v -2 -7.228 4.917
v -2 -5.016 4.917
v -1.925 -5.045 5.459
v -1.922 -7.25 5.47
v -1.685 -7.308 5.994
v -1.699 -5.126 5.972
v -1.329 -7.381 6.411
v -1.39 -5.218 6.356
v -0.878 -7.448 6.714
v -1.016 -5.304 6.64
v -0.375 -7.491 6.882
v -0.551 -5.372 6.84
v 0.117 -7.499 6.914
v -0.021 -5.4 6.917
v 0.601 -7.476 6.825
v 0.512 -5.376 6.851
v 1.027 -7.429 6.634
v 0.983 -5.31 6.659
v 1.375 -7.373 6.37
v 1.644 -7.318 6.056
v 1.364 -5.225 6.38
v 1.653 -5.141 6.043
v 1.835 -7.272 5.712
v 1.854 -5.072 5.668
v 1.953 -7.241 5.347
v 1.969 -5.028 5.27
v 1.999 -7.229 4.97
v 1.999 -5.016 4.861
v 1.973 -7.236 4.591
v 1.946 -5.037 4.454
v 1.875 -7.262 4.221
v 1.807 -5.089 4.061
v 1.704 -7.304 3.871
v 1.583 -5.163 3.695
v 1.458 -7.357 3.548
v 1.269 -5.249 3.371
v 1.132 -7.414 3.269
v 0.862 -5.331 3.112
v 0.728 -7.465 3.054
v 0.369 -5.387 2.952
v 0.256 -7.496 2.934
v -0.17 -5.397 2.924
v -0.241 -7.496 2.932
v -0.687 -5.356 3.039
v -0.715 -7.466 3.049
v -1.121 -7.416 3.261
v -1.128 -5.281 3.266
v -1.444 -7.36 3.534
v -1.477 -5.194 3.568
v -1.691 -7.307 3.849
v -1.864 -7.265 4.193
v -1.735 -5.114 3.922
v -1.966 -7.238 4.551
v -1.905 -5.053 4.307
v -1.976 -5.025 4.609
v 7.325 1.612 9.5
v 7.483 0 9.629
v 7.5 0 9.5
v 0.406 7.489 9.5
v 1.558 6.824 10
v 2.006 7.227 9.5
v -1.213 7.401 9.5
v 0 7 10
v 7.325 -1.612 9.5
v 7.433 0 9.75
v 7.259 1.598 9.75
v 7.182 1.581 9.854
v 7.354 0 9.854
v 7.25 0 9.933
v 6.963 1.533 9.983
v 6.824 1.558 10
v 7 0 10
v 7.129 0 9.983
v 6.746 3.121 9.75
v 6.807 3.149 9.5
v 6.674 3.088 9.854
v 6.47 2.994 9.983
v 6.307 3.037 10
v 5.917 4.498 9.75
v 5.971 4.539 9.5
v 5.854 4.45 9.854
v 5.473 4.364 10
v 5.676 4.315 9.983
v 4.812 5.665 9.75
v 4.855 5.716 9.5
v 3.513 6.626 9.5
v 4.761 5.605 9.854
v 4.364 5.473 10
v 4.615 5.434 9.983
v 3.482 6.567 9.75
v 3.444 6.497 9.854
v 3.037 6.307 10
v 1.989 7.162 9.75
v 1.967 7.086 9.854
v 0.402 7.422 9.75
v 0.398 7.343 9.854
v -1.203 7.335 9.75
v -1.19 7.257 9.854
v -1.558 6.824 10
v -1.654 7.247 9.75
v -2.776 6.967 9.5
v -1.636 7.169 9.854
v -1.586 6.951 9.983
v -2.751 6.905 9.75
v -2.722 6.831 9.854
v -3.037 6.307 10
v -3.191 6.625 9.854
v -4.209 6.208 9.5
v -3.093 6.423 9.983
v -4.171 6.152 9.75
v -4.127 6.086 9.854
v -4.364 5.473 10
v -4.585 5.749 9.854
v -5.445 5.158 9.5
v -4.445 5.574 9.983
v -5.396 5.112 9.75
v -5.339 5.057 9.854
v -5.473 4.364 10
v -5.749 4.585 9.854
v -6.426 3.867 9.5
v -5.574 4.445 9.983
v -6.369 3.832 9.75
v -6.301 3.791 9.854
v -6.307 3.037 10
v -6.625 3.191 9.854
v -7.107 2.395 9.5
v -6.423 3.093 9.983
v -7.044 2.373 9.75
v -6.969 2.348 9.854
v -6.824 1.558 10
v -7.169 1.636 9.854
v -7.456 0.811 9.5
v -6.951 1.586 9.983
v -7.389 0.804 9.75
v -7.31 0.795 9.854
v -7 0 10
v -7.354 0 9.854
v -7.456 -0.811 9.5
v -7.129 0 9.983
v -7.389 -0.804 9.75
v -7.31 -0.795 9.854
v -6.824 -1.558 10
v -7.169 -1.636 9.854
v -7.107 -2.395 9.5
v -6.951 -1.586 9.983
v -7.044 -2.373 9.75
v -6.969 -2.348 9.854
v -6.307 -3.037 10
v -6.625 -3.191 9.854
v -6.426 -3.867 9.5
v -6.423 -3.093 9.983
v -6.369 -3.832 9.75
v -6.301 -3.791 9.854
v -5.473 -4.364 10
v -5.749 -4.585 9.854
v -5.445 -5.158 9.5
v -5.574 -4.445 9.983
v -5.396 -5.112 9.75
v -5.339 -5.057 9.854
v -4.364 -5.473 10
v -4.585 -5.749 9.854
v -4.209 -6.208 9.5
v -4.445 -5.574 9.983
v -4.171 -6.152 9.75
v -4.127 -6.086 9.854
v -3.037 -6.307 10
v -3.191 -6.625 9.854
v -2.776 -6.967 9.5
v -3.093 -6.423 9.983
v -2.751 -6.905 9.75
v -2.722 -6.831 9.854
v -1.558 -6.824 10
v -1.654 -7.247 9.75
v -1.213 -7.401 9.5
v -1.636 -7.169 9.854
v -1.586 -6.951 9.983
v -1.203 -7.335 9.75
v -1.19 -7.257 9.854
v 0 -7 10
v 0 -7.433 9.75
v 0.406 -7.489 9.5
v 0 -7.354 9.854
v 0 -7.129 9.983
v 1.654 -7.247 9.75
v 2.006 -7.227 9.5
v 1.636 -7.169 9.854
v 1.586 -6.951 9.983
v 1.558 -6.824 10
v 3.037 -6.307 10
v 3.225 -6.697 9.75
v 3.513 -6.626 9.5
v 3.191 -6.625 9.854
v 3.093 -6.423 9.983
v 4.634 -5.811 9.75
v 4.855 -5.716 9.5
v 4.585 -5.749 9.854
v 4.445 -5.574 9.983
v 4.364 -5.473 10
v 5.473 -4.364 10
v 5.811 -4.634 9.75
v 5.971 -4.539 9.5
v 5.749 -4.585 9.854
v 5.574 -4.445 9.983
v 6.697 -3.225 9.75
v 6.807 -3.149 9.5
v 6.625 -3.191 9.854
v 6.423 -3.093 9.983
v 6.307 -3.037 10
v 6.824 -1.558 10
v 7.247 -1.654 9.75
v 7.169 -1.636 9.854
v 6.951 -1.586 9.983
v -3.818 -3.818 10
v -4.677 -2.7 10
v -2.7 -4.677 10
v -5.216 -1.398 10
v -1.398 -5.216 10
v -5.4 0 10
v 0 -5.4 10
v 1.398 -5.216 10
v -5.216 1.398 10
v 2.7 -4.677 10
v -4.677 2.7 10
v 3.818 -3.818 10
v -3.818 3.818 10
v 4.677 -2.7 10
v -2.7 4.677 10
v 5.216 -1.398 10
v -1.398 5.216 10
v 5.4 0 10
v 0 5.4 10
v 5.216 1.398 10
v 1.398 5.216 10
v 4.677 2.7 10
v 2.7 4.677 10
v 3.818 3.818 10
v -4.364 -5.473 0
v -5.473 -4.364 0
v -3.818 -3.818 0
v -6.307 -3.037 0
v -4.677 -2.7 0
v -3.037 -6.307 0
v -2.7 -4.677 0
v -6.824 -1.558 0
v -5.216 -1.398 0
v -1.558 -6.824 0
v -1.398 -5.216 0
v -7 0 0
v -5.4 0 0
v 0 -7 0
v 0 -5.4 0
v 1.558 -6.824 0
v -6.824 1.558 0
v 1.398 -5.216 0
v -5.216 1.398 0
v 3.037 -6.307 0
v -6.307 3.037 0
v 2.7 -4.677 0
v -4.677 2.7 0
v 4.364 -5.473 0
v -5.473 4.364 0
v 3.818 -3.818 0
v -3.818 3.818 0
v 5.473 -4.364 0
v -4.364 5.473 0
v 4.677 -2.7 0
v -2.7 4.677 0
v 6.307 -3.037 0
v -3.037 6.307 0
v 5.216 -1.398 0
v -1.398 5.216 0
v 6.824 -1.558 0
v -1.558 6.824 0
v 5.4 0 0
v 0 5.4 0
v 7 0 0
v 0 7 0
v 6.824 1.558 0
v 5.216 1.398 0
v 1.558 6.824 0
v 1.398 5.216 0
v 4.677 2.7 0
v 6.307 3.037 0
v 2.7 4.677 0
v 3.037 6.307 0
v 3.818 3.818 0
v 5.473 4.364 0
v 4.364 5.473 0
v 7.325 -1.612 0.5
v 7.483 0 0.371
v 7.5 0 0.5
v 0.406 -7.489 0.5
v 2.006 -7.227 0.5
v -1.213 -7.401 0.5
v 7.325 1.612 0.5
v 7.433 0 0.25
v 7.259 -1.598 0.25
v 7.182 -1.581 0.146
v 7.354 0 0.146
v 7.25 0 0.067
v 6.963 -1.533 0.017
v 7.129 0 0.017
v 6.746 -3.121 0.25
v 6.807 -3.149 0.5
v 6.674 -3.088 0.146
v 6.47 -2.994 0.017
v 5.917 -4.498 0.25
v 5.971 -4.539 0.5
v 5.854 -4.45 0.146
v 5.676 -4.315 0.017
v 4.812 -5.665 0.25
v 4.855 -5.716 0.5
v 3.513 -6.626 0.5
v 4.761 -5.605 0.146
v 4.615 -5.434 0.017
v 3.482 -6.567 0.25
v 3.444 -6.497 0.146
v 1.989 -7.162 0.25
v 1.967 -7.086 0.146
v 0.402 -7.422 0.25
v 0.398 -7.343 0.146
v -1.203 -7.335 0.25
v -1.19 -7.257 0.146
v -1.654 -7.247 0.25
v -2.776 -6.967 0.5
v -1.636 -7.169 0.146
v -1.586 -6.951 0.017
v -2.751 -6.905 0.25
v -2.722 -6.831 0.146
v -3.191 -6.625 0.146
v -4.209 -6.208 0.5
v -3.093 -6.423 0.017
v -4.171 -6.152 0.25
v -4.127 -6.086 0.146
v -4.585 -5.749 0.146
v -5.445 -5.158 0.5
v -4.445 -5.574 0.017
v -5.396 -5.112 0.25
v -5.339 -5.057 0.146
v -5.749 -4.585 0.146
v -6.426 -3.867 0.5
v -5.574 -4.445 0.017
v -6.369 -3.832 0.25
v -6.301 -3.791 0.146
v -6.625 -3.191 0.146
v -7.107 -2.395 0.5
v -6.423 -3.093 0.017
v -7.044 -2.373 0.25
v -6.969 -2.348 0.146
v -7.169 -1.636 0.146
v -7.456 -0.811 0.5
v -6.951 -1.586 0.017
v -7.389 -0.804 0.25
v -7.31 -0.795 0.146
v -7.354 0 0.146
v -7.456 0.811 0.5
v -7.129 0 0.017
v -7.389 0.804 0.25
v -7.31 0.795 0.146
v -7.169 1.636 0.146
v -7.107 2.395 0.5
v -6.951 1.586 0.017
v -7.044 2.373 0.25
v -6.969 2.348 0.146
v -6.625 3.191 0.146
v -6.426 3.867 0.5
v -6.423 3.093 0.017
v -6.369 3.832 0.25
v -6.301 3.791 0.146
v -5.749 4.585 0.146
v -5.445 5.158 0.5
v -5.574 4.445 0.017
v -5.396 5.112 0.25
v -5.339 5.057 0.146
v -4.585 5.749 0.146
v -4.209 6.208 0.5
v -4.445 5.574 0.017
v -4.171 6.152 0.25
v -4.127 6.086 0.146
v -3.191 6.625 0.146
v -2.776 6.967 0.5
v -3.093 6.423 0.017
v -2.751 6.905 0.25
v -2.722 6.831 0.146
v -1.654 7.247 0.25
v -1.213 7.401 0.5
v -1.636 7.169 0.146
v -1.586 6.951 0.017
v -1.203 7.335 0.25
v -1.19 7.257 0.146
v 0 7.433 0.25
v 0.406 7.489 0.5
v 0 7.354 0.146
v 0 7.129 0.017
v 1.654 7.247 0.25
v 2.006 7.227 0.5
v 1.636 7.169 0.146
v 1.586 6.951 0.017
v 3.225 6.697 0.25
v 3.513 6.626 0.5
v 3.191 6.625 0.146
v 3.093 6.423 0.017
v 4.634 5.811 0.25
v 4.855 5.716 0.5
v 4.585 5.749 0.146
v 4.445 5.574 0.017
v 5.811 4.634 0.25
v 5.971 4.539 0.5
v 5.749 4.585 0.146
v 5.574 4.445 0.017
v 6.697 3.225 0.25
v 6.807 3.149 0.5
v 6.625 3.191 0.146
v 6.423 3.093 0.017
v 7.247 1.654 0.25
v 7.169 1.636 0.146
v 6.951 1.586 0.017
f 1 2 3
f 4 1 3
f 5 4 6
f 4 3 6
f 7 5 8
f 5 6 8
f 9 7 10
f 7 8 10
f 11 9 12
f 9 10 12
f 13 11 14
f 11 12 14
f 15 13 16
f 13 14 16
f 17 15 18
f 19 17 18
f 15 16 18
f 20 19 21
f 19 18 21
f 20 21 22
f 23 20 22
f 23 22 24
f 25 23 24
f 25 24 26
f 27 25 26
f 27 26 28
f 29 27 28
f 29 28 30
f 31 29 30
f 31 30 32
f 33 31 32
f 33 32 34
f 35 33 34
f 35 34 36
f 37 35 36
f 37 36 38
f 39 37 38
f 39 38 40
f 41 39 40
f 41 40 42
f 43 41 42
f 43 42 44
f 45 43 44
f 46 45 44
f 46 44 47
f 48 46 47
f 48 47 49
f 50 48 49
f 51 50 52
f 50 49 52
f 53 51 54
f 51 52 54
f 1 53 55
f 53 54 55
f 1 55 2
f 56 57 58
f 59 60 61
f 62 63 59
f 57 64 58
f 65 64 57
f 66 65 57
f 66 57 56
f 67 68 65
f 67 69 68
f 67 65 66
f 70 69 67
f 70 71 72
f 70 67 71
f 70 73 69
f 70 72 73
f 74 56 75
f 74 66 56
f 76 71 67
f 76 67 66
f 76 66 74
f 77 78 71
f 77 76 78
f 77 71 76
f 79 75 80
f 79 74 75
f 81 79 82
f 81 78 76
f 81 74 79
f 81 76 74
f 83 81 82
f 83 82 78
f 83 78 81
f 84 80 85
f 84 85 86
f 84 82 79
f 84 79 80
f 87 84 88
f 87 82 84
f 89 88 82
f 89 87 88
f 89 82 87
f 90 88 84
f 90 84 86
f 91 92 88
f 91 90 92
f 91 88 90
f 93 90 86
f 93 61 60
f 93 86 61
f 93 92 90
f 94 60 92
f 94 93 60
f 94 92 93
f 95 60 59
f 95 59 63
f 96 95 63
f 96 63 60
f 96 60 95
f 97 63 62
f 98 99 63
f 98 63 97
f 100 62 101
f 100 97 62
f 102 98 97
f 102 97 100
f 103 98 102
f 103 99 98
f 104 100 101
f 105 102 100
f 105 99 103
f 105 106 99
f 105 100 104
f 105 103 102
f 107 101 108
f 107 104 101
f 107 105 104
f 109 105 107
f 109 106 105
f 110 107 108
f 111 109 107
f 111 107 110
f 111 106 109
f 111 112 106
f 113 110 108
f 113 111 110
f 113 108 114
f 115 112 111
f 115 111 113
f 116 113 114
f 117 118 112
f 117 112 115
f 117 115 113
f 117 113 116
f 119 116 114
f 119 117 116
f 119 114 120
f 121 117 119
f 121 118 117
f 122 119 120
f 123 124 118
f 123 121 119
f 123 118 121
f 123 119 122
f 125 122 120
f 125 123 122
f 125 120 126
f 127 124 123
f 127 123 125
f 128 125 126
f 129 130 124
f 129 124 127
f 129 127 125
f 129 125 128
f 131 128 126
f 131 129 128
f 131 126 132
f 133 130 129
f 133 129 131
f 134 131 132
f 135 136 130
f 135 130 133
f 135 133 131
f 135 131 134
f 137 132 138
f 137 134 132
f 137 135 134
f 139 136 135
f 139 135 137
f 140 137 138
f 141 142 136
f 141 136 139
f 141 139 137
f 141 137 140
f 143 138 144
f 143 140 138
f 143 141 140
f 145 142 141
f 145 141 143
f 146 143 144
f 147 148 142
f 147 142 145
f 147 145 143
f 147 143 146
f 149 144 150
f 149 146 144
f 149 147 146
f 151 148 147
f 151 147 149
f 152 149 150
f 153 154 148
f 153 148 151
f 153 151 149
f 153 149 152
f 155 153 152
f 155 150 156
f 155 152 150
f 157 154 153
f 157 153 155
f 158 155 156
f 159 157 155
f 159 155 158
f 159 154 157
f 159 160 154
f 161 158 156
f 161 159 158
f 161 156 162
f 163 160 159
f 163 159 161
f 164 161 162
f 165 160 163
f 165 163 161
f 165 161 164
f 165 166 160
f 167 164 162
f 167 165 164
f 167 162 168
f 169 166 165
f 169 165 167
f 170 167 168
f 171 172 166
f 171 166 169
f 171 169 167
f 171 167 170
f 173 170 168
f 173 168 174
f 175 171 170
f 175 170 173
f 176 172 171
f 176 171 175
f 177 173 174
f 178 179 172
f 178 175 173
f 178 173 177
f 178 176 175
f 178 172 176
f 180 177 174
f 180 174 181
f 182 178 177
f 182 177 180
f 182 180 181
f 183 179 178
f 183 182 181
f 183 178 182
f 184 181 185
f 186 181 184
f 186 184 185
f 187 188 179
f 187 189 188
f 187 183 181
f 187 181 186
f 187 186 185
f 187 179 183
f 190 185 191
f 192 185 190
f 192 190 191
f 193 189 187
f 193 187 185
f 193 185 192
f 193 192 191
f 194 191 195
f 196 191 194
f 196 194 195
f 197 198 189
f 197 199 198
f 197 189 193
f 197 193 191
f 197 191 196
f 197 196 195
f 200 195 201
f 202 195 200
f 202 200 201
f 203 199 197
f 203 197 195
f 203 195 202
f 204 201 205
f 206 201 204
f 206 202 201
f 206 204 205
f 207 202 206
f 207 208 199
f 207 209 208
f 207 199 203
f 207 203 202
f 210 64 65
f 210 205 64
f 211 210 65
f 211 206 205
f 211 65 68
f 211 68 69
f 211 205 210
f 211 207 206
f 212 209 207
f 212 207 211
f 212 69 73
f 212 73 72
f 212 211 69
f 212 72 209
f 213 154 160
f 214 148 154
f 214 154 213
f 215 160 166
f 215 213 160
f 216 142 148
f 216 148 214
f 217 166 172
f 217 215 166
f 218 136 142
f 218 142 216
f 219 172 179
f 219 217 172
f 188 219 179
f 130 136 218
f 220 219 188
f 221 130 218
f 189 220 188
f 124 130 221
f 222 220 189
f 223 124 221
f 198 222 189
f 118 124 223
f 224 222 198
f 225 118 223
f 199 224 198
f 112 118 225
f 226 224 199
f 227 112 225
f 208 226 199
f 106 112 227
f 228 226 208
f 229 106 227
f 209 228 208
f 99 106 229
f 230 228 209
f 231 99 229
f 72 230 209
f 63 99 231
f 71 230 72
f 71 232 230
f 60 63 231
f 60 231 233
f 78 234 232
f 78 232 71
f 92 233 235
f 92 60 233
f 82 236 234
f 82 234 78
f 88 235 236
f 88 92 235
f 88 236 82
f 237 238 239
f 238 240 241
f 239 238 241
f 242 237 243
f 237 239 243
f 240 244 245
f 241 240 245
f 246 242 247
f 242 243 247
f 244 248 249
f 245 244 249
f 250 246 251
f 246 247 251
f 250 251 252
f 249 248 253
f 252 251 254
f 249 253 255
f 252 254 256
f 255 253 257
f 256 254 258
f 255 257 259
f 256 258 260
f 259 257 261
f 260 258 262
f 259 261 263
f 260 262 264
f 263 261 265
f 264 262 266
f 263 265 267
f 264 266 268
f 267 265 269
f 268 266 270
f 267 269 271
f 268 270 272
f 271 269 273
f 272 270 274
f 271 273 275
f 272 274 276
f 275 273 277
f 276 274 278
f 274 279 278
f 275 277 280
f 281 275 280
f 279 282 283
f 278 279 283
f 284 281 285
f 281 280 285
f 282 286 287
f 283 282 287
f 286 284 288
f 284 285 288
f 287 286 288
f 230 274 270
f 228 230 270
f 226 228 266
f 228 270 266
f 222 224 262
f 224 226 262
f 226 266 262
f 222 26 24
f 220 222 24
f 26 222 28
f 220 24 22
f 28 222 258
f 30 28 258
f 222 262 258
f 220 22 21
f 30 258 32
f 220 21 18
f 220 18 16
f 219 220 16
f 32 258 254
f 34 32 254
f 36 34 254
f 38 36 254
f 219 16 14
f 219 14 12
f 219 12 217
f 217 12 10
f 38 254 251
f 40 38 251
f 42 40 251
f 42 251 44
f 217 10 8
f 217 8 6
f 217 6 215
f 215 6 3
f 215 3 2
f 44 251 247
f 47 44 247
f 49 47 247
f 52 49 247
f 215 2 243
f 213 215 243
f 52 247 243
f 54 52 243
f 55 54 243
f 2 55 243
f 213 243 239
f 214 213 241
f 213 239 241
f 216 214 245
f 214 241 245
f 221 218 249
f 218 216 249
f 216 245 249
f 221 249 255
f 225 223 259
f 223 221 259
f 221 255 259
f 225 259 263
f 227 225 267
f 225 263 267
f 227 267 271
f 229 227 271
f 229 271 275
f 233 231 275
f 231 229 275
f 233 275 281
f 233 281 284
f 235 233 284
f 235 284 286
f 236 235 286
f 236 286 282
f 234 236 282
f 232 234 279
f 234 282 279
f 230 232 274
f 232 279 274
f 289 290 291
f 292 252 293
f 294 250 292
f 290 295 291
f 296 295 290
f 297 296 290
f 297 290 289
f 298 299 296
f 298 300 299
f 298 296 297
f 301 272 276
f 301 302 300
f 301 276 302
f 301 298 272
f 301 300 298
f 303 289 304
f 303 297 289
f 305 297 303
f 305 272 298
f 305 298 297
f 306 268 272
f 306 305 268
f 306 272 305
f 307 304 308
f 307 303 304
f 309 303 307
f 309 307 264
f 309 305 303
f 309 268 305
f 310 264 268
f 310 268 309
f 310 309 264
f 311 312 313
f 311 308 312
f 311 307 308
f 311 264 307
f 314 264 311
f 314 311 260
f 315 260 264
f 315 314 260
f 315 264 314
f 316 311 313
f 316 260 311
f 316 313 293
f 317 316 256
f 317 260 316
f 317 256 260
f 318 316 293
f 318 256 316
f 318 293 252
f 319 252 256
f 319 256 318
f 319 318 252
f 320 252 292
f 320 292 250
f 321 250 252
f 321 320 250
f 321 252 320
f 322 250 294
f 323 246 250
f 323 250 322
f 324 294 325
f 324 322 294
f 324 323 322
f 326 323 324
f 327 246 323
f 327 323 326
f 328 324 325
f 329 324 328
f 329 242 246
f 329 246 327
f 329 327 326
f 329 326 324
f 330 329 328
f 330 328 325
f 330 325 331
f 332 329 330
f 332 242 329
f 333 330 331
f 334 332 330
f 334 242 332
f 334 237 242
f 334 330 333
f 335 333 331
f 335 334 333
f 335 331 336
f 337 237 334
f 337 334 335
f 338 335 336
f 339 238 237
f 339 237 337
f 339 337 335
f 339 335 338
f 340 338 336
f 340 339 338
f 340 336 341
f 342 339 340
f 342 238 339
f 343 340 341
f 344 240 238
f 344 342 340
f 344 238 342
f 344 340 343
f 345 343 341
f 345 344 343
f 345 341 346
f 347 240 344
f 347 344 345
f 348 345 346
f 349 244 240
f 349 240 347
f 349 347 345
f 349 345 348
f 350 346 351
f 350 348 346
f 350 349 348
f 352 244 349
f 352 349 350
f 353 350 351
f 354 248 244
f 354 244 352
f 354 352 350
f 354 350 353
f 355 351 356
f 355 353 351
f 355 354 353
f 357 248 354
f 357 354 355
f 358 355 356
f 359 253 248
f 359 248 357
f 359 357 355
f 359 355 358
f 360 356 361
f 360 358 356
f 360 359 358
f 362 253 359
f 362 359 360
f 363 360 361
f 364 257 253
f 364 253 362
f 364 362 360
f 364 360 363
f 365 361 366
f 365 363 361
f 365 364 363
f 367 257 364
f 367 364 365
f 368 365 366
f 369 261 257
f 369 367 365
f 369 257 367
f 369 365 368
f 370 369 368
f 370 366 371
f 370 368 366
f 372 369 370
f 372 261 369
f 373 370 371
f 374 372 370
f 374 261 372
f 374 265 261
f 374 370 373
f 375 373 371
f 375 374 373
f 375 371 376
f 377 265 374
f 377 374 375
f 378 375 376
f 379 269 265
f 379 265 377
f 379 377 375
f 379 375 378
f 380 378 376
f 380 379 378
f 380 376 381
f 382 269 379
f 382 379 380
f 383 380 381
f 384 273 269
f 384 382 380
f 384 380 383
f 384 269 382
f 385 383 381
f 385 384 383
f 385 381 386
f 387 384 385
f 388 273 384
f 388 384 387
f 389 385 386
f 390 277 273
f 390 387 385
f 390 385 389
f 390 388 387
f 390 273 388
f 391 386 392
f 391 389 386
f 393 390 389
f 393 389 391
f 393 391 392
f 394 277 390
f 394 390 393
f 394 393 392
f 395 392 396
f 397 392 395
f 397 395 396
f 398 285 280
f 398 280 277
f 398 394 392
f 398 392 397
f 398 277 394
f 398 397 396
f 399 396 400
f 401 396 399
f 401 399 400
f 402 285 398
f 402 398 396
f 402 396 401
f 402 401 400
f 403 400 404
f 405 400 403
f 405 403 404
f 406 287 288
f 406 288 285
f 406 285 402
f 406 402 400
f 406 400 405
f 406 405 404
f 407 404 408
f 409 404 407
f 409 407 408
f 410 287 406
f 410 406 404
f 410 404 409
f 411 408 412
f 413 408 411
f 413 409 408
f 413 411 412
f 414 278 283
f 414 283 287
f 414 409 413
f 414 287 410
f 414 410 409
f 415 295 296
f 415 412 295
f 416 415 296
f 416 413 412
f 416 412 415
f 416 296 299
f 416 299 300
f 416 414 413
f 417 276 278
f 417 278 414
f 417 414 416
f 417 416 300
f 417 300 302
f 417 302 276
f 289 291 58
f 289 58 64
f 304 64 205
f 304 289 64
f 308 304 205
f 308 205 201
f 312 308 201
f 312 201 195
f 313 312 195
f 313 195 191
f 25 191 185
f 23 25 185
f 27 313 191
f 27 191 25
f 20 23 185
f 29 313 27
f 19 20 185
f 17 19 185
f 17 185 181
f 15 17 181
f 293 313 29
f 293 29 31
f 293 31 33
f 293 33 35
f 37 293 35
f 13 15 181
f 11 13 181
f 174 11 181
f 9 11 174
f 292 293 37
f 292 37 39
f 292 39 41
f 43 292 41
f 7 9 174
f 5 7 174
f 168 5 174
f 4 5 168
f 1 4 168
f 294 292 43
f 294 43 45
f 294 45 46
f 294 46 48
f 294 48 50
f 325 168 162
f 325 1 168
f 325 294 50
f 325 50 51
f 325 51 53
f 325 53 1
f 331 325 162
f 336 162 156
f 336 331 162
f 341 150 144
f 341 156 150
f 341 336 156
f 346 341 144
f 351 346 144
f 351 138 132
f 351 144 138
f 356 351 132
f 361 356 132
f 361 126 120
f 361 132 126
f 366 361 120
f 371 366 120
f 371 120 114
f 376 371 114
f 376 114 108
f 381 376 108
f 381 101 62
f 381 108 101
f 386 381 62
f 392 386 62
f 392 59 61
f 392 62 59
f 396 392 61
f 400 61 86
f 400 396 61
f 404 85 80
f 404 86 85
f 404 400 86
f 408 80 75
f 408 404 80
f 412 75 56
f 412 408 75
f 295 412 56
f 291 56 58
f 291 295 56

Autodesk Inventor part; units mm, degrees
ref_plane "YZ Plane" through (0, 0, 0) normal (1, 0, 0) x (0, 1, 0)
ref_plane "XZ Plane" through (0, 0, 0) normal (0, 1, 0) x (-1, 0, 0)
ref_plane "XY Plane" through (0, 0, 0) normal (0, 0, 1) x (1, 0, 0)
sketch "Sketch1" plane through (0, 0, 0) normal (0, 0, 1) x (1, 0, 0)
  circle A0 centre (0, 0) radius 5.4
  circle A1 centre (0, 0) radius 7.5
  dimension "d0" = 10.8
  dimension "d1" = 15
extrude "Extrusion1" add sketch "Sketch1" along normal blind 10
fillet "Fillet1" radius 0.5 2 edges at (-7.5, 0, 10) (-7.5, 0, 0)
sketch "Sketch4" plane through (0, 0, 0) normal (0, 1, 0) x (-1, 0, 0)
  circle A0 centre (0, 4.9172) radius 2
  point P0 (0, 0)
  dimension "d5" = 4
extrude "Extrusion2" cut sketch "Sketch4" against normal blind 10
equation "\"BendRadius\" = Thickness"
equation "\"BendReliefWidth\" = Thickness"
equation "\"BendReliefDepth\" = 0.5 * Thickness"
equation "\"CornerReliefSize\" = 4 * Thickness"
equation "\"MinimumRemnant\" = 2 * Thickness"
equation "\"TransitionRadius\" = BendRadius"
equation "\"JacobiRadiusSize\" = BendRadius"
equation "\"GapSize\" = Thickness"
equation "\"Thickness\" = 0.5"
properties part number "khóa trục"
